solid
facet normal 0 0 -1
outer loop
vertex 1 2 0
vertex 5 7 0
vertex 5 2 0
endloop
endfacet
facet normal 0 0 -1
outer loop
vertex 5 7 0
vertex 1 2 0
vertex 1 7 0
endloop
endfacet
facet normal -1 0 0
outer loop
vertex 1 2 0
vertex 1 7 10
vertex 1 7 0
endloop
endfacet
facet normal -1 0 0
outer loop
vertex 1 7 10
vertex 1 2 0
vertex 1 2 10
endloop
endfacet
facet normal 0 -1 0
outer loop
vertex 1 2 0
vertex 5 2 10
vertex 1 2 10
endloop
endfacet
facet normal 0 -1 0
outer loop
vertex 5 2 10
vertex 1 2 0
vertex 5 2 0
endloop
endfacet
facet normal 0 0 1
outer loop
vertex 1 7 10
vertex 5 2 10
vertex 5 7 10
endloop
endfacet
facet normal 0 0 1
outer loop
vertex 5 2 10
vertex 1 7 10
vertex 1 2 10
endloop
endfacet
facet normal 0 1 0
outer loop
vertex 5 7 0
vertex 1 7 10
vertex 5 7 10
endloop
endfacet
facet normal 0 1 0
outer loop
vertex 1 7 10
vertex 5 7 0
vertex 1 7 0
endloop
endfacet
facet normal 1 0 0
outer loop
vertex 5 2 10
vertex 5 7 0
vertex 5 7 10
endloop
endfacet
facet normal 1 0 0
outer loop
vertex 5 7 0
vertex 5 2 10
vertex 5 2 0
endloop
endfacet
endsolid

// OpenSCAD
union() {
    translate([1, 2, 0]) cube([1, 1, 1]);
    translate([1, 2, 1]) cube([1, 1, 1]);
    translate([1, 2, 2]) cube([1, 1, 1]);
    translate([1, 2, 3]) cube([1, 1, 1]);
    translate([1, 2, 4]) cube([1, 1, 1]);
    translate([1, 2, 5]) cube([1, 1, 1]);
    translate([1, 2, 6]) cube([1, 1, 1]);
    translate([1, 2, 7]) cube([1, 1, 1]);
    translate([1, 2, 8]) cube([1, 1, 1]);
    translate([1, 2, 9]) cube([1, 1, 1]);
    translate([1, 3, 0]) cube([1, 1, 1]);
    translate([1, 3, 1]) cube([1, 1, 1]);
    translate([1, 3, 2]) cube([1, 1, 1]);
    translate([1, 3, 3]) cube([1, 1, 1]);
    translate([1, 3, 4]) cube([1, 1, 1]);
    translate([1, 3, 5]) cube([1, 1, 1]);
    translate([1, 3, 6]) cube([1, 1, 1]);
    translate([1, 3, 7]) cube([1, 1, 1]);
    translate([1, 3, 8]) cube([1, 1, 1]);
    translate([1, 3, 9]) cube([1, 1, 1]);
    translate([1, 4, 0]) cube([1, 1, 1]);
    translate([1, 4, 1]) cube([1, 1, 1]);
    translate([1, 4, 2]) cube([1, 1, 1]);
    translate([1, 4, 3]) cube([1, 1, 1]);
    translate([1, 4, 4]) cube([1, 1, 1]);
    translate([1, 4, 5]) cube([1, 1, 1]);
    translate([1, 4, 6]) cube([1, 1, 1]);
    translate([1, 4, 7]) cube([1, 1, 1]);
    translate([1, 4, 8]) cube([1, 1, 1]);
    translate([1, 4, 9]) cube([1, 1, 1]);
    translate([1, 5, 0]) cube([1, 1, 1]);
    translate([1, 5, 1]) cube([1, 1, 1]);
    translate([1, 5, 2]) cube([1, 1, 1]);
    translate([1, 5, 3]) cube([1, 1, 1]);
    translate([1, 5, 4]) cube([1, 1, 1]);
    translate([1, 5, 5]) cube([1, 1, 1]);
    translate([1, 5, 6]) cube([1, 1, 1]);
    translate([1, 5, 7]) cube([1, 1, 1]);
    translate([1, 5, 8]) cube([1, 1, 1]);
    translate([1, 5, 9]) cube([1, 1, 1]);
    translate([1, 6, 0]) cube([1, 1, 1]);
    translate([1, 6, 1]) cube([1, 1, 1]);
    translate([1, 6, 2]) cube([1, 1, 1]);
    translate([1, 6, 3]) cube([1, 1, 1]);
    translate([1, 6, 4]) cube([1, 1, 1]);
    translate([1, 6, 5]) cube([1, 1, 1]);
    translate([1, 6, 6]) cube([1, 1, 1]);
    translate([1, 6, 7]) cube([1, 1, 1]);
    translate([1, 6, 8]) cube([1, 1, 1]);
    translate([1, 6, 9]) cube([1, 1, 1]);
    translate([2, 2, 0]) cube([1, 1, 1]);
    translate([2, 2, 1]) cube([1, 1, 1]);
    translate([2, 2, 2]) cube([1, 1, 1]);
    translate([2, 2, 3]) cube([1, 1, 1]);
    translate([2, 2, 4]) cube([1, 1, 1]);
    translate([2, 2, 5]) cube([1, 1, 1]);
    translate([2, 2, 6]) cube([1, 1, 1]);
    translate([2, 2, 7]) cube([1, 1, 1]);
    translate([2, 2, 8]) cube([1, 1, 1]);
    translate([2, 2, 9]) cube([1, 1, 1]);
    translate([2, 3, 0]) cube([1, 1, 1]);
    translate([2, 3, 1]) cube([1, 1, 1]);
    translate([2, 3, 2]) cube([1, 1, 1]);
    translate([2, 3, 3]) cube([1, 1, 1]);
    translate([2, 3, 4]) cube([1, 1, 1]);
    translate([2, 3, 5]) cube([1, 1, 1]);
    translate([2, 3, 6]) cube([1, 1, 1]);
    translate([2, 3, 7]) cube([1, 1, 1]);
    translate([2, 3, 8]) cube([1, 1, 1]);
    translate([2, 3, 9]) cube([1, 1, 1]);
    translate([2, 4, 0]) cube([1, 1, 1]);
    translate([2, 4, 1]) cube([1, 1, 1]);
    translate([2, 4, 2]) cube([1, 1, 1]);
    translate([2, 4, 3]) cube([1, 1, 1]);
    translate([2, 4, 4]) cube([1, 1, 1]);
    translate([2, 4, 5]) cube([1, 1, 1]);
    translate([2, 4, 6]) cube([1, 1, 1]);
    translate([2, 4, 7]) cube([1, 1, 1]);
    translate([2, 4, 8]) cube([1, 1, 1]);
    translate([2, 4, 9]) cube([1, 1, 1]);
    translate([2, 5, 0]) cube([1, 1, 1]);
    translate([2, 5, 1]) cube([1, 1, 1]);
    translate([2, 5, 2]) cube([1, 1, 1]);
    translate([2, 5, 3]) cube([1, 1, 1]);
    translate([2, 5, 4]) cube([1, 1, 1]);
    translate([2, 5, 5]) cube([1, 1, 1]);
    translate([2, 5, 6]) cube([1, 1, 1]);
    translate([2, 5, 7]) cube([1, 1, 1]);
    translate([2, 5, 8]) cube([1, 1, 1]);
    translate([2, 5, 9]) cube([1, 1, 1]);
    translate([2, 6, 0]) cube([1, 1, 1]);
    translate([2, 6, 1]) cube([1, 1, 1]);
    translate([2, 6, 2]) cube([1, 1, 1]);
    translate([2, 6, 3]) cube([1, 1, 1]);
    translate([2, 6, 4]) cube([1, 1, 1]);
    translate([2, 6, 5]) cube([1, 1, 1]);
    translate([2, 6, 6]) cube([1, 1, 1]);
    translate([2, 6, 7]) cube([1, 1, 1]);
    translate([2, 6, 8]) cube([1, 1, 1]);
    translate([2, 6, 9]) cube([1, 1, 1]);
    translate([3, 2, 0]) cube([1, 1, 1]);
    translate([3, 2, 1]) cube([1, 1, 1]);
    translate([3, 2, 2]) cube([1, 1, 1]);
    translate([3, 2, 3]) cube([1, 1, 1]);
    translate([3, 2, 4]) cube([1, 1, 1]);
    translate([3, 2, 5]) cube([1, 1, 1]);
    translate([3, 2, 6]) cube([1, 1, 1]);
    translate([3, 2, 7]) cube([1, 1, 1]);
    translate([3, 2, 8]) cube([1, 1, 1]);
    translate([3, 2, 9]) cube([1, 1, 1]);
    translate([3, 3, 0]) cube([1, 1, 1]);
    translate([3, 3, 1]) cube([1, 1, 1]);
    translate([3, 3, 2]) cube([1, 1, 1]);
    translate([3, 3, 3]) cube([1, 1, 1]);
    translate([3, 3, 4]) cube([1, 1, 1]);
    translate([3, 3, 5]) cube([1, 1, 1]);
    translate([3, 3, 6]) cube([1, 1, 1]);
    translate([3, 3, 7]) cube([1, 1, 1]);
    translate([3, 3, 8]) cube([1, 1, 1]);
    translate([3, 3, 9]) cube([1, 1, 1]);
    translate([3, 4, 0]) cube([1, 1, 1]);
    translate([3, 4, 1]) cube([1, 1, 1]);
    translate([3, 4, 2]) cube([1, 1, 1]);
    translate([3, 4, 3]) cube([1, 1, 1]);
    translate([3, 4, 4]) cube([1, 1, 1]);
    translate([3, 4, 5]) cube([1, 1, 1]);
    translate([3, 4, 6]) cube([1, 1, 1]);
    translate([3, 4, 7]) cube([1, 1, 1]);
    translate([3, 4, 8]) cube([1, 1, 1]);
    translate([3, 4, 9]) cube([1, 1, 1]);
    translate([3, 5, 0]) cube([1, 1, 1]);
    translate([3, 5, 1]) cube([1, 1, 1]);
    translate([3, 5, 2]) cube([1, 1, 1]);
    translate([3, 5, 3]) cube([1, 1, 1]);
    translate([3, 5, 4]) cube([1, 1, 1]);
    translate([3, 5, 5]) cube([1, 1, 1]);
    translate([3, 5, 6]) cube([1, 1, 1]);
    translate([3, 5, 7]) cube([1, 1, 1]);
    translate([3, 5, 8]) cube([1, 1, 1]);
    translate([3, 5, 9]) cube([1, 1, 1]);
    translate([3, 6, 0]) cube([1, 1, 1]);
    translate([3, 6, 1]) cube([1, 1, 1]);
    translate([3, 6, 2]) cube([1, 1, 1]);
    translate([3, 6, 3]) cube([1, 1, 1]);
    translate([3, 6, 4]) cube([1, 1, 1]);
    translate([3, 6, 5]) cube([1, 1, 1]);
    translate([3, 6, 6]) cube([1, 1, 1]);
    translate([3, 6, 7]) cube([1, 1, 1]);
    translate([3, 6, 8]) cube([1, 1, 1]);
    translate([3, 6, 9]) cube([1, 1, 1]);
    translate([4, 2, 0]) cube([1, 1, 1]);
    translate([4, 2, 1]) cube([1, 1, 1]);
    translate([4, 2, 2]) cube([1, 1, 1]);
    translate([4, 2, 3]) cube([1, 1, 1]);
    translate([4, 2, 4]) cube([1, 1, 1]);
    translate([4, 2, 5]) cube([1, 1, 1]);
    translate([4, 2, 6]) cube([1, 1, 1]);
    translate([4, 2, 7]) cube([1, 1, 1]);
    translate([4, 2, 8]) cube([1, 1, 1]);
    translate([4, 2, 9]) cube([1, 1, 1]);
    translate([4, 3, 0]) cube([1, 1, 1]);
    translate([4, 3, 1]) cube([1, 1, 1]);
    translate([4, 3, 2]) cube([1, 1, 1]);
    translate([4, 3, 3]) cube([1, 1, 1]);
    translate([4, 3, 4]) cube([1, 1, 1]);
    translate([4, 3, 5]) cube([1, 1, 1]);
    translate([4, 3, 6]) cube([1, 1, 1]);
    translate([4, 3, 7]) cube([1, 1, 1]);
    translate([4, 3, 8]) cube([1, 1, 1]);
    translate([4, 3, 9]) cube([1, 1, 1]);
    translate([4, 4, 0]) cube([1, 1, 1]);
    translate([4, 4, 1]) cube([1, 1, 1]);
    translate([4, 4, 2]) cube([1, 1, 1]);
    translate([4, 4, 3]) cube([1, 1, 1]);
    translate([4, 4, 4]) cube([1, 1, 1]);
    translate([4, 4, 5]) cube([1, 1, 1]);
    translate([4, 4, 6]) cube([1, 1, 1]);
    translate([4, 4, 7]) cube([1, 1, 1]);
    translate([4, 4, 8]) cube([1, 1, 1]);
    translate([4, 4, 9]) cube([1, 1, 1]);
    translate([4, 5, 0]) cube([1, 1, 1]);
    translate([4, 5, 1]) cube([1, 1, 1]);
    translate([4, 5, 2]) cube([1, 1, 1]);
    translate([4, 5, 3]) cube([1, 1, 1]);
    translate([4, 5, 4]) cube([1, 1, 1]);
    translate([4, 5, 5]) cube([1, 1, 1]);
    translate([4, 5, 6]) cube([1, 1, 1]);
    translate([4, 5, 7]) cube([1, 1, 1]);
    translate([4, 5, 8]) cube([1, 1, 1]);
    translate([4, 5, 9]) cube([1, 1, 1]);
    translate([4, 6, 0]) cube([1, 1, 1]);
    translate([4, 6, 1]) cube([1, 1, 1]);
    translate([4, 6, 2]) cube([1, 1, 1]);
    translate([4, 6, 3]) cube([1, 1, 1]);
    translate([4, 6, 4]) cube([1, 1, 1]);
    translate([4, 6, 5]) cube([1, 1, 1]);
    translate([4, 6, 6]) cube([1, 1, 1]);
    translate([4, 6, 7]) cube([1, 1, 1]);
    translate([4, 6, 8]) cube([1, 1, 1]);
    translate([4, 6, 9]) cube([1, 1, 1]);
}
